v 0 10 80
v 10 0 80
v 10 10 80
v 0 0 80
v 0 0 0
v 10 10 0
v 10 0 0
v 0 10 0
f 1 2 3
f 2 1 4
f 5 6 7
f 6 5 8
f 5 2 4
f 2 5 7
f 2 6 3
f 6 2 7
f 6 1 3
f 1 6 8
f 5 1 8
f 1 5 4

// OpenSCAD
 module kistarto(l, w, h){
      rotate([90, 0, 0]) polyhedron(
               points=[[0,0,0], [l,0,0], [l,w,0], [0,w,0], [0,w,h], [l,w,h]],
              faces=[[0,1,2,3],[5,4,3,2],[0,4,5,1],[0,3,4],[5,2,1]]
              );
}


cube([10, 10, 80]);
